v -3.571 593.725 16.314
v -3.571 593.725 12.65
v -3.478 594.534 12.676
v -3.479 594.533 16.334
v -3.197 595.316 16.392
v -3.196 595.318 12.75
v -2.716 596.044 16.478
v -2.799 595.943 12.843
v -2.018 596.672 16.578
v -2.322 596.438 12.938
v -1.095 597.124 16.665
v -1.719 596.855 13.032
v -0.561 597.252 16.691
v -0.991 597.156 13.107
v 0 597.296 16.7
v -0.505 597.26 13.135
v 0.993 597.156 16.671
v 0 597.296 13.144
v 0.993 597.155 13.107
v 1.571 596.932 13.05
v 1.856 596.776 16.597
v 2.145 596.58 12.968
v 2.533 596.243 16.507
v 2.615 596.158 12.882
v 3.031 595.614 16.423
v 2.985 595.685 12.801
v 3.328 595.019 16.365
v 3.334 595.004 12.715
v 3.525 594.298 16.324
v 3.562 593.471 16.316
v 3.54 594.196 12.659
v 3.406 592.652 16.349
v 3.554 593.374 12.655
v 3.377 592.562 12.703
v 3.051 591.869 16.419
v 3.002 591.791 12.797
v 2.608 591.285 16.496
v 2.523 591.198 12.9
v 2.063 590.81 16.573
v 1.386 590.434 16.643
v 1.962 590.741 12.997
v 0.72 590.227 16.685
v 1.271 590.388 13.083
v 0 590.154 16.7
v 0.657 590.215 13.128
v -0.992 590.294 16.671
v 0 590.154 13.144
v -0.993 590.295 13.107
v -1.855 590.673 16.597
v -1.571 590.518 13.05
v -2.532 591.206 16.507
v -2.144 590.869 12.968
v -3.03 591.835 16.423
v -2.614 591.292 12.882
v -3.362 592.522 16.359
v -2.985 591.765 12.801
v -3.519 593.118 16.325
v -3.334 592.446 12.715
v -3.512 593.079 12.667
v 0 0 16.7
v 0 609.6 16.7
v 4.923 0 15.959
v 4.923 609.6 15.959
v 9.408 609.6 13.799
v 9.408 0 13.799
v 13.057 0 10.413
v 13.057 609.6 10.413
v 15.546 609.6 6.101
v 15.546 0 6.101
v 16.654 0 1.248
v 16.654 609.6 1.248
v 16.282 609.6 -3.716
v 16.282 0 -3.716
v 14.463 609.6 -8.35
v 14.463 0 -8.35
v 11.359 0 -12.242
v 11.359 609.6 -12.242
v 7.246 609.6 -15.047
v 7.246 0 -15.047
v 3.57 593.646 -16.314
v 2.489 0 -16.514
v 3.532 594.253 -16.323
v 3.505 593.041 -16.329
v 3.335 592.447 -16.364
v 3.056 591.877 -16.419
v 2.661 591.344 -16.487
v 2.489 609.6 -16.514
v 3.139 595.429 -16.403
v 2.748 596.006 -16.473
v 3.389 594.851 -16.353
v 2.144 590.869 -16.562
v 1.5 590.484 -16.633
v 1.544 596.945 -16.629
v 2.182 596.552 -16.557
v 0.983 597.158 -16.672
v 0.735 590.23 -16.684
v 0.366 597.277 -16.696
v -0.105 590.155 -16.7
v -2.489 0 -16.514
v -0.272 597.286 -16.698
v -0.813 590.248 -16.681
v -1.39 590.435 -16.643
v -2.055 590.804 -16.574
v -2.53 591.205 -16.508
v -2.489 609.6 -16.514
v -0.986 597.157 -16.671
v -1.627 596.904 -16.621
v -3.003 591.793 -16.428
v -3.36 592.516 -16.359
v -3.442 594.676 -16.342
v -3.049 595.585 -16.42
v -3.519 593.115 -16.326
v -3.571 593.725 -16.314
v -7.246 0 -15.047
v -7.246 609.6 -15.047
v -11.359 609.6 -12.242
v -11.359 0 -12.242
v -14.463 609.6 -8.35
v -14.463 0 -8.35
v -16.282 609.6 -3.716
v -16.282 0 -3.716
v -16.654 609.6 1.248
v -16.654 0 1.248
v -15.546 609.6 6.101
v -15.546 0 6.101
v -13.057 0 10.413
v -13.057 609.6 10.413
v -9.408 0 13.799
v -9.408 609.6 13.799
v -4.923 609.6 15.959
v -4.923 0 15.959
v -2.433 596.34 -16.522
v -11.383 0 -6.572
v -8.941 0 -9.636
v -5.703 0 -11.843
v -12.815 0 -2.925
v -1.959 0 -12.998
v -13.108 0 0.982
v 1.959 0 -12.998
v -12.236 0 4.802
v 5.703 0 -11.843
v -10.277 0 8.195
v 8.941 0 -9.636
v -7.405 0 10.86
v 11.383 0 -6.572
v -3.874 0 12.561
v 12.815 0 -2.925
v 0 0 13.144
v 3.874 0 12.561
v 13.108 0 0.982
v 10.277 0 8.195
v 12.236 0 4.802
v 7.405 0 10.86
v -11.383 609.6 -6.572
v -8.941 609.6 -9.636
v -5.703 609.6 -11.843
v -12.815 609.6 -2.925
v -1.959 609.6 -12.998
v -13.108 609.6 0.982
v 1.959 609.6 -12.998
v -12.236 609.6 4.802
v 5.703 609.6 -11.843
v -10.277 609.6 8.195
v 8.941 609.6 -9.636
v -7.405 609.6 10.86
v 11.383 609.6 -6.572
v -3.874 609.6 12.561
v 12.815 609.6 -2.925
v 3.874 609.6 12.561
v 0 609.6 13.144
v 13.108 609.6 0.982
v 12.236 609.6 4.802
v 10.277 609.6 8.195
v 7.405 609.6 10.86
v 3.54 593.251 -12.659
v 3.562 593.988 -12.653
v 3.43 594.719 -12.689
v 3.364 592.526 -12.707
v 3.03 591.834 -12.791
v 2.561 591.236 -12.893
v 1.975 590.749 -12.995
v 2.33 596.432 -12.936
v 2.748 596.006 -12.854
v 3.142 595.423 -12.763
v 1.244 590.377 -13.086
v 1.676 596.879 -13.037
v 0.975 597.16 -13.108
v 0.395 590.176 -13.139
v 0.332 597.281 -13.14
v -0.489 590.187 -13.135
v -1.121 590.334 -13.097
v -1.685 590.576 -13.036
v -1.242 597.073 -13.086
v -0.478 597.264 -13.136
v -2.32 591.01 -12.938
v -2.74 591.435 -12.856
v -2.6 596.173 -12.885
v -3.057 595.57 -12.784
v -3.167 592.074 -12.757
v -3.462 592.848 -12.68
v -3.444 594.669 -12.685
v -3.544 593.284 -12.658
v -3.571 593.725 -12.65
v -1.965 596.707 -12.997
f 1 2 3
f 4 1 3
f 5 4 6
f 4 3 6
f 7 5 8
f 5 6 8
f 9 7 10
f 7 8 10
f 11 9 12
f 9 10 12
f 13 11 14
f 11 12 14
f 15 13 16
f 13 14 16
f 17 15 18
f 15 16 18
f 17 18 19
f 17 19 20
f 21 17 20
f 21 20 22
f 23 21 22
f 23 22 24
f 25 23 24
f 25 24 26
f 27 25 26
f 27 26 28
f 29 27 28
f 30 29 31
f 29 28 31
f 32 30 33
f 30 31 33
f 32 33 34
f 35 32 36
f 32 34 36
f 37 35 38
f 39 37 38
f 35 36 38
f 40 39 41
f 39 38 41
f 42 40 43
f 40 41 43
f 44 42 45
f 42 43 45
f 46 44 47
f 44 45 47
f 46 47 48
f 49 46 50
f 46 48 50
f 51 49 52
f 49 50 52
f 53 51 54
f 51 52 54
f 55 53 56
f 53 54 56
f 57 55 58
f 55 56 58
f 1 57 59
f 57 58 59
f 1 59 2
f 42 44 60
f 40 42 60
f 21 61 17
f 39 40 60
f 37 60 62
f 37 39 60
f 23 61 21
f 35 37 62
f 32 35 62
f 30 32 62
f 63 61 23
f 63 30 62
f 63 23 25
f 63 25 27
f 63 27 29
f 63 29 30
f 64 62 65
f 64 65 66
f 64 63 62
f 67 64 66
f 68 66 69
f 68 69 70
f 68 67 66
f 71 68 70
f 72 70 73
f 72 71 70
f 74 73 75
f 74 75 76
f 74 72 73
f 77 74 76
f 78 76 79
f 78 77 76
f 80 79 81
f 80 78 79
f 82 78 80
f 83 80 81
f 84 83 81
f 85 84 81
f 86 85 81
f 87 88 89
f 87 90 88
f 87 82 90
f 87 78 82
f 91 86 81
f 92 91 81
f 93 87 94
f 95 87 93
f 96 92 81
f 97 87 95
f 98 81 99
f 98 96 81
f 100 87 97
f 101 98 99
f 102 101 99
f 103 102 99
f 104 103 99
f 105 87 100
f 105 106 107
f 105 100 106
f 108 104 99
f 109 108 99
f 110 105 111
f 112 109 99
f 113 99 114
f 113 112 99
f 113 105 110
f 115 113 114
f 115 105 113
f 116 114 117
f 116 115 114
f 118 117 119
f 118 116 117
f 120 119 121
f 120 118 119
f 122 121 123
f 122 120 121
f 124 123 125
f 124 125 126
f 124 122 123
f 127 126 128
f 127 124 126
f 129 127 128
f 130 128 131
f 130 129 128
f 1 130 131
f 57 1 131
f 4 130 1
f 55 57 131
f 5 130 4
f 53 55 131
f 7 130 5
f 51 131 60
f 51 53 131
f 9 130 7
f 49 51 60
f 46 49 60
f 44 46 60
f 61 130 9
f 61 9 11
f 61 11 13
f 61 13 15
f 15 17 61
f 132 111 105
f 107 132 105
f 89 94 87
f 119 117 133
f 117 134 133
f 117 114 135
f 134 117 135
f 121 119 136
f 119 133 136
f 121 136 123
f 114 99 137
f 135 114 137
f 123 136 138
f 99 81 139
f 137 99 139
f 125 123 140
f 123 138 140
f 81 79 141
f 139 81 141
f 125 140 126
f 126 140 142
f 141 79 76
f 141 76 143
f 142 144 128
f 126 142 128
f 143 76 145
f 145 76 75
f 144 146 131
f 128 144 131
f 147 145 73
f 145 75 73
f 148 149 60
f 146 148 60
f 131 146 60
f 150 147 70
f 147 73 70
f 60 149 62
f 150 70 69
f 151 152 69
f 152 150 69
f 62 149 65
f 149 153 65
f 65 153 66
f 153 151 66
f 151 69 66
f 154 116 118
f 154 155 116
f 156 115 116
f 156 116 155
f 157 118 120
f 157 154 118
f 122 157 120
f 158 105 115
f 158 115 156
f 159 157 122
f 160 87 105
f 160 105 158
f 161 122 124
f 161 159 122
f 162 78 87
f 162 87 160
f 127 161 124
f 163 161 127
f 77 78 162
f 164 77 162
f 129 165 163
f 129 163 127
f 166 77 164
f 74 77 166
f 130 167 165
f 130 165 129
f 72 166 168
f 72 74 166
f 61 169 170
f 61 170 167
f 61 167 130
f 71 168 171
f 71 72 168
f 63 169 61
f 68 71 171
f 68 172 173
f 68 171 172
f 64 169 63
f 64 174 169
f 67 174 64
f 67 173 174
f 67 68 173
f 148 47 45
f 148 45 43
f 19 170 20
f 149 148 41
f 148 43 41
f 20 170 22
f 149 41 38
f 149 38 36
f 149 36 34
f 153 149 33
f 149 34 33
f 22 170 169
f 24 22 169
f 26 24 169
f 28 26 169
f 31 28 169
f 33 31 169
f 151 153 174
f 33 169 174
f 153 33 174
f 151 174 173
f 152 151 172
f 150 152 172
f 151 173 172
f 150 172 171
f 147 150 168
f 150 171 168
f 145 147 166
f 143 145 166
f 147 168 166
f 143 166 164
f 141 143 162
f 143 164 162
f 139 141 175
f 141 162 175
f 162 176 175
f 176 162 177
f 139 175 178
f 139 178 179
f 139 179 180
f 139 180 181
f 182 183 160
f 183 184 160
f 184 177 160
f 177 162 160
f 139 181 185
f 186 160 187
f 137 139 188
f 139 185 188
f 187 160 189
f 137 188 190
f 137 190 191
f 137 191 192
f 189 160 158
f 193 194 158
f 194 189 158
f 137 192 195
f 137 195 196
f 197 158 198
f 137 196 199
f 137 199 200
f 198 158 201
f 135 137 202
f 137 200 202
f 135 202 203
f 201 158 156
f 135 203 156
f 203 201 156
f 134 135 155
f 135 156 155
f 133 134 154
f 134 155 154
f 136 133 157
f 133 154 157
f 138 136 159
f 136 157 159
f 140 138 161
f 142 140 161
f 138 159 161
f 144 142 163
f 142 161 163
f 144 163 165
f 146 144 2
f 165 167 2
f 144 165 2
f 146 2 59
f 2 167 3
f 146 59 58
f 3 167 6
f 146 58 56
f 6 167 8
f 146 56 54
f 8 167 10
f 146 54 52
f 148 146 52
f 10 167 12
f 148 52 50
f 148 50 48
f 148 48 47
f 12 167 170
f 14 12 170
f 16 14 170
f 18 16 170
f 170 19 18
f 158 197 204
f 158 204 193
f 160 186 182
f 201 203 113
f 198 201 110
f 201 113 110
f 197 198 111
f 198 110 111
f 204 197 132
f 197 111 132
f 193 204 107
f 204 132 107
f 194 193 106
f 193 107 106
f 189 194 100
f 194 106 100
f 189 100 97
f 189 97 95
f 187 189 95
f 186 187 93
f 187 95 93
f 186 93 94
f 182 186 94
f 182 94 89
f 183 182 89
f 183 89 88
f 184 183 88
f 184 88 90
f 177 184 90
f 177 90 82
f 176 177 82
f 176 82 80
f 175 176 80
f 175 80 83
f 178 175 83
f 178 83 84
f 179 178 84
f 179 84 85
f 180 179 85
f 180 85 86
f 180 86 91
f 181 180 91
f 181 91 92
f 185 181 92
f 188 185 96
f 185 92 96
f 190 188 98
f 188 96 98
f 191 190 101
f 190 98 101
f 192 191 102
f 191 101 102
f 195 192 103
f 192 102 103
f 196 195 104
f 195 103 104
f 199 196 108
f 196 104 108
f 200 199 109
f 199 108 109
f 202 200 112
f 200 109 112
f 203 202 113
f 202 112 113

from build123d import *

# Parameters (mm, degrees)
SWEEP1_PROFILE_R        = 16.7005
SHELL1_T                = -3.556
F_1_4_CLEARANCE_HOLE4_D = 7.14248


with BuildPart() as part:
    # Sweep1: sweep along a path in Sketch2
    with BuildLine(Plane(origin=(0, 0, 0), x_dir=(0, 0, -1), z_dir=(1, 0, 0))) as sweep1_path:
        Line((0, 0), (0, 609.6))
    # Sweep1 profile (on start of the path) → Sweep1 (sweep)
    with BuildSketch(Plane.ZX):
        Circle(SWEEP1_PROFILE_R)
    sweep(path=sweep1_path.line)

    # Shell1
    shell1_openings = [part.faces().sort_by_distance(p)[0] for p in [
        (0, 609.6, 16.7005),
        (0, 0, 16.7005),
    ]]
    offset(amount=SHELL1_T, openings=shell1_openings, kind=Kind.INTERSECTION)

    # 1/4 Clearance Hole4 (through all)
    with Locations(Plane.XY.offset(16.7005)):
        with Locations((0, 593.725)):
            Hole(F_1_4_CLEARANCE_HOLE4_D / 2)


solid = part.part
